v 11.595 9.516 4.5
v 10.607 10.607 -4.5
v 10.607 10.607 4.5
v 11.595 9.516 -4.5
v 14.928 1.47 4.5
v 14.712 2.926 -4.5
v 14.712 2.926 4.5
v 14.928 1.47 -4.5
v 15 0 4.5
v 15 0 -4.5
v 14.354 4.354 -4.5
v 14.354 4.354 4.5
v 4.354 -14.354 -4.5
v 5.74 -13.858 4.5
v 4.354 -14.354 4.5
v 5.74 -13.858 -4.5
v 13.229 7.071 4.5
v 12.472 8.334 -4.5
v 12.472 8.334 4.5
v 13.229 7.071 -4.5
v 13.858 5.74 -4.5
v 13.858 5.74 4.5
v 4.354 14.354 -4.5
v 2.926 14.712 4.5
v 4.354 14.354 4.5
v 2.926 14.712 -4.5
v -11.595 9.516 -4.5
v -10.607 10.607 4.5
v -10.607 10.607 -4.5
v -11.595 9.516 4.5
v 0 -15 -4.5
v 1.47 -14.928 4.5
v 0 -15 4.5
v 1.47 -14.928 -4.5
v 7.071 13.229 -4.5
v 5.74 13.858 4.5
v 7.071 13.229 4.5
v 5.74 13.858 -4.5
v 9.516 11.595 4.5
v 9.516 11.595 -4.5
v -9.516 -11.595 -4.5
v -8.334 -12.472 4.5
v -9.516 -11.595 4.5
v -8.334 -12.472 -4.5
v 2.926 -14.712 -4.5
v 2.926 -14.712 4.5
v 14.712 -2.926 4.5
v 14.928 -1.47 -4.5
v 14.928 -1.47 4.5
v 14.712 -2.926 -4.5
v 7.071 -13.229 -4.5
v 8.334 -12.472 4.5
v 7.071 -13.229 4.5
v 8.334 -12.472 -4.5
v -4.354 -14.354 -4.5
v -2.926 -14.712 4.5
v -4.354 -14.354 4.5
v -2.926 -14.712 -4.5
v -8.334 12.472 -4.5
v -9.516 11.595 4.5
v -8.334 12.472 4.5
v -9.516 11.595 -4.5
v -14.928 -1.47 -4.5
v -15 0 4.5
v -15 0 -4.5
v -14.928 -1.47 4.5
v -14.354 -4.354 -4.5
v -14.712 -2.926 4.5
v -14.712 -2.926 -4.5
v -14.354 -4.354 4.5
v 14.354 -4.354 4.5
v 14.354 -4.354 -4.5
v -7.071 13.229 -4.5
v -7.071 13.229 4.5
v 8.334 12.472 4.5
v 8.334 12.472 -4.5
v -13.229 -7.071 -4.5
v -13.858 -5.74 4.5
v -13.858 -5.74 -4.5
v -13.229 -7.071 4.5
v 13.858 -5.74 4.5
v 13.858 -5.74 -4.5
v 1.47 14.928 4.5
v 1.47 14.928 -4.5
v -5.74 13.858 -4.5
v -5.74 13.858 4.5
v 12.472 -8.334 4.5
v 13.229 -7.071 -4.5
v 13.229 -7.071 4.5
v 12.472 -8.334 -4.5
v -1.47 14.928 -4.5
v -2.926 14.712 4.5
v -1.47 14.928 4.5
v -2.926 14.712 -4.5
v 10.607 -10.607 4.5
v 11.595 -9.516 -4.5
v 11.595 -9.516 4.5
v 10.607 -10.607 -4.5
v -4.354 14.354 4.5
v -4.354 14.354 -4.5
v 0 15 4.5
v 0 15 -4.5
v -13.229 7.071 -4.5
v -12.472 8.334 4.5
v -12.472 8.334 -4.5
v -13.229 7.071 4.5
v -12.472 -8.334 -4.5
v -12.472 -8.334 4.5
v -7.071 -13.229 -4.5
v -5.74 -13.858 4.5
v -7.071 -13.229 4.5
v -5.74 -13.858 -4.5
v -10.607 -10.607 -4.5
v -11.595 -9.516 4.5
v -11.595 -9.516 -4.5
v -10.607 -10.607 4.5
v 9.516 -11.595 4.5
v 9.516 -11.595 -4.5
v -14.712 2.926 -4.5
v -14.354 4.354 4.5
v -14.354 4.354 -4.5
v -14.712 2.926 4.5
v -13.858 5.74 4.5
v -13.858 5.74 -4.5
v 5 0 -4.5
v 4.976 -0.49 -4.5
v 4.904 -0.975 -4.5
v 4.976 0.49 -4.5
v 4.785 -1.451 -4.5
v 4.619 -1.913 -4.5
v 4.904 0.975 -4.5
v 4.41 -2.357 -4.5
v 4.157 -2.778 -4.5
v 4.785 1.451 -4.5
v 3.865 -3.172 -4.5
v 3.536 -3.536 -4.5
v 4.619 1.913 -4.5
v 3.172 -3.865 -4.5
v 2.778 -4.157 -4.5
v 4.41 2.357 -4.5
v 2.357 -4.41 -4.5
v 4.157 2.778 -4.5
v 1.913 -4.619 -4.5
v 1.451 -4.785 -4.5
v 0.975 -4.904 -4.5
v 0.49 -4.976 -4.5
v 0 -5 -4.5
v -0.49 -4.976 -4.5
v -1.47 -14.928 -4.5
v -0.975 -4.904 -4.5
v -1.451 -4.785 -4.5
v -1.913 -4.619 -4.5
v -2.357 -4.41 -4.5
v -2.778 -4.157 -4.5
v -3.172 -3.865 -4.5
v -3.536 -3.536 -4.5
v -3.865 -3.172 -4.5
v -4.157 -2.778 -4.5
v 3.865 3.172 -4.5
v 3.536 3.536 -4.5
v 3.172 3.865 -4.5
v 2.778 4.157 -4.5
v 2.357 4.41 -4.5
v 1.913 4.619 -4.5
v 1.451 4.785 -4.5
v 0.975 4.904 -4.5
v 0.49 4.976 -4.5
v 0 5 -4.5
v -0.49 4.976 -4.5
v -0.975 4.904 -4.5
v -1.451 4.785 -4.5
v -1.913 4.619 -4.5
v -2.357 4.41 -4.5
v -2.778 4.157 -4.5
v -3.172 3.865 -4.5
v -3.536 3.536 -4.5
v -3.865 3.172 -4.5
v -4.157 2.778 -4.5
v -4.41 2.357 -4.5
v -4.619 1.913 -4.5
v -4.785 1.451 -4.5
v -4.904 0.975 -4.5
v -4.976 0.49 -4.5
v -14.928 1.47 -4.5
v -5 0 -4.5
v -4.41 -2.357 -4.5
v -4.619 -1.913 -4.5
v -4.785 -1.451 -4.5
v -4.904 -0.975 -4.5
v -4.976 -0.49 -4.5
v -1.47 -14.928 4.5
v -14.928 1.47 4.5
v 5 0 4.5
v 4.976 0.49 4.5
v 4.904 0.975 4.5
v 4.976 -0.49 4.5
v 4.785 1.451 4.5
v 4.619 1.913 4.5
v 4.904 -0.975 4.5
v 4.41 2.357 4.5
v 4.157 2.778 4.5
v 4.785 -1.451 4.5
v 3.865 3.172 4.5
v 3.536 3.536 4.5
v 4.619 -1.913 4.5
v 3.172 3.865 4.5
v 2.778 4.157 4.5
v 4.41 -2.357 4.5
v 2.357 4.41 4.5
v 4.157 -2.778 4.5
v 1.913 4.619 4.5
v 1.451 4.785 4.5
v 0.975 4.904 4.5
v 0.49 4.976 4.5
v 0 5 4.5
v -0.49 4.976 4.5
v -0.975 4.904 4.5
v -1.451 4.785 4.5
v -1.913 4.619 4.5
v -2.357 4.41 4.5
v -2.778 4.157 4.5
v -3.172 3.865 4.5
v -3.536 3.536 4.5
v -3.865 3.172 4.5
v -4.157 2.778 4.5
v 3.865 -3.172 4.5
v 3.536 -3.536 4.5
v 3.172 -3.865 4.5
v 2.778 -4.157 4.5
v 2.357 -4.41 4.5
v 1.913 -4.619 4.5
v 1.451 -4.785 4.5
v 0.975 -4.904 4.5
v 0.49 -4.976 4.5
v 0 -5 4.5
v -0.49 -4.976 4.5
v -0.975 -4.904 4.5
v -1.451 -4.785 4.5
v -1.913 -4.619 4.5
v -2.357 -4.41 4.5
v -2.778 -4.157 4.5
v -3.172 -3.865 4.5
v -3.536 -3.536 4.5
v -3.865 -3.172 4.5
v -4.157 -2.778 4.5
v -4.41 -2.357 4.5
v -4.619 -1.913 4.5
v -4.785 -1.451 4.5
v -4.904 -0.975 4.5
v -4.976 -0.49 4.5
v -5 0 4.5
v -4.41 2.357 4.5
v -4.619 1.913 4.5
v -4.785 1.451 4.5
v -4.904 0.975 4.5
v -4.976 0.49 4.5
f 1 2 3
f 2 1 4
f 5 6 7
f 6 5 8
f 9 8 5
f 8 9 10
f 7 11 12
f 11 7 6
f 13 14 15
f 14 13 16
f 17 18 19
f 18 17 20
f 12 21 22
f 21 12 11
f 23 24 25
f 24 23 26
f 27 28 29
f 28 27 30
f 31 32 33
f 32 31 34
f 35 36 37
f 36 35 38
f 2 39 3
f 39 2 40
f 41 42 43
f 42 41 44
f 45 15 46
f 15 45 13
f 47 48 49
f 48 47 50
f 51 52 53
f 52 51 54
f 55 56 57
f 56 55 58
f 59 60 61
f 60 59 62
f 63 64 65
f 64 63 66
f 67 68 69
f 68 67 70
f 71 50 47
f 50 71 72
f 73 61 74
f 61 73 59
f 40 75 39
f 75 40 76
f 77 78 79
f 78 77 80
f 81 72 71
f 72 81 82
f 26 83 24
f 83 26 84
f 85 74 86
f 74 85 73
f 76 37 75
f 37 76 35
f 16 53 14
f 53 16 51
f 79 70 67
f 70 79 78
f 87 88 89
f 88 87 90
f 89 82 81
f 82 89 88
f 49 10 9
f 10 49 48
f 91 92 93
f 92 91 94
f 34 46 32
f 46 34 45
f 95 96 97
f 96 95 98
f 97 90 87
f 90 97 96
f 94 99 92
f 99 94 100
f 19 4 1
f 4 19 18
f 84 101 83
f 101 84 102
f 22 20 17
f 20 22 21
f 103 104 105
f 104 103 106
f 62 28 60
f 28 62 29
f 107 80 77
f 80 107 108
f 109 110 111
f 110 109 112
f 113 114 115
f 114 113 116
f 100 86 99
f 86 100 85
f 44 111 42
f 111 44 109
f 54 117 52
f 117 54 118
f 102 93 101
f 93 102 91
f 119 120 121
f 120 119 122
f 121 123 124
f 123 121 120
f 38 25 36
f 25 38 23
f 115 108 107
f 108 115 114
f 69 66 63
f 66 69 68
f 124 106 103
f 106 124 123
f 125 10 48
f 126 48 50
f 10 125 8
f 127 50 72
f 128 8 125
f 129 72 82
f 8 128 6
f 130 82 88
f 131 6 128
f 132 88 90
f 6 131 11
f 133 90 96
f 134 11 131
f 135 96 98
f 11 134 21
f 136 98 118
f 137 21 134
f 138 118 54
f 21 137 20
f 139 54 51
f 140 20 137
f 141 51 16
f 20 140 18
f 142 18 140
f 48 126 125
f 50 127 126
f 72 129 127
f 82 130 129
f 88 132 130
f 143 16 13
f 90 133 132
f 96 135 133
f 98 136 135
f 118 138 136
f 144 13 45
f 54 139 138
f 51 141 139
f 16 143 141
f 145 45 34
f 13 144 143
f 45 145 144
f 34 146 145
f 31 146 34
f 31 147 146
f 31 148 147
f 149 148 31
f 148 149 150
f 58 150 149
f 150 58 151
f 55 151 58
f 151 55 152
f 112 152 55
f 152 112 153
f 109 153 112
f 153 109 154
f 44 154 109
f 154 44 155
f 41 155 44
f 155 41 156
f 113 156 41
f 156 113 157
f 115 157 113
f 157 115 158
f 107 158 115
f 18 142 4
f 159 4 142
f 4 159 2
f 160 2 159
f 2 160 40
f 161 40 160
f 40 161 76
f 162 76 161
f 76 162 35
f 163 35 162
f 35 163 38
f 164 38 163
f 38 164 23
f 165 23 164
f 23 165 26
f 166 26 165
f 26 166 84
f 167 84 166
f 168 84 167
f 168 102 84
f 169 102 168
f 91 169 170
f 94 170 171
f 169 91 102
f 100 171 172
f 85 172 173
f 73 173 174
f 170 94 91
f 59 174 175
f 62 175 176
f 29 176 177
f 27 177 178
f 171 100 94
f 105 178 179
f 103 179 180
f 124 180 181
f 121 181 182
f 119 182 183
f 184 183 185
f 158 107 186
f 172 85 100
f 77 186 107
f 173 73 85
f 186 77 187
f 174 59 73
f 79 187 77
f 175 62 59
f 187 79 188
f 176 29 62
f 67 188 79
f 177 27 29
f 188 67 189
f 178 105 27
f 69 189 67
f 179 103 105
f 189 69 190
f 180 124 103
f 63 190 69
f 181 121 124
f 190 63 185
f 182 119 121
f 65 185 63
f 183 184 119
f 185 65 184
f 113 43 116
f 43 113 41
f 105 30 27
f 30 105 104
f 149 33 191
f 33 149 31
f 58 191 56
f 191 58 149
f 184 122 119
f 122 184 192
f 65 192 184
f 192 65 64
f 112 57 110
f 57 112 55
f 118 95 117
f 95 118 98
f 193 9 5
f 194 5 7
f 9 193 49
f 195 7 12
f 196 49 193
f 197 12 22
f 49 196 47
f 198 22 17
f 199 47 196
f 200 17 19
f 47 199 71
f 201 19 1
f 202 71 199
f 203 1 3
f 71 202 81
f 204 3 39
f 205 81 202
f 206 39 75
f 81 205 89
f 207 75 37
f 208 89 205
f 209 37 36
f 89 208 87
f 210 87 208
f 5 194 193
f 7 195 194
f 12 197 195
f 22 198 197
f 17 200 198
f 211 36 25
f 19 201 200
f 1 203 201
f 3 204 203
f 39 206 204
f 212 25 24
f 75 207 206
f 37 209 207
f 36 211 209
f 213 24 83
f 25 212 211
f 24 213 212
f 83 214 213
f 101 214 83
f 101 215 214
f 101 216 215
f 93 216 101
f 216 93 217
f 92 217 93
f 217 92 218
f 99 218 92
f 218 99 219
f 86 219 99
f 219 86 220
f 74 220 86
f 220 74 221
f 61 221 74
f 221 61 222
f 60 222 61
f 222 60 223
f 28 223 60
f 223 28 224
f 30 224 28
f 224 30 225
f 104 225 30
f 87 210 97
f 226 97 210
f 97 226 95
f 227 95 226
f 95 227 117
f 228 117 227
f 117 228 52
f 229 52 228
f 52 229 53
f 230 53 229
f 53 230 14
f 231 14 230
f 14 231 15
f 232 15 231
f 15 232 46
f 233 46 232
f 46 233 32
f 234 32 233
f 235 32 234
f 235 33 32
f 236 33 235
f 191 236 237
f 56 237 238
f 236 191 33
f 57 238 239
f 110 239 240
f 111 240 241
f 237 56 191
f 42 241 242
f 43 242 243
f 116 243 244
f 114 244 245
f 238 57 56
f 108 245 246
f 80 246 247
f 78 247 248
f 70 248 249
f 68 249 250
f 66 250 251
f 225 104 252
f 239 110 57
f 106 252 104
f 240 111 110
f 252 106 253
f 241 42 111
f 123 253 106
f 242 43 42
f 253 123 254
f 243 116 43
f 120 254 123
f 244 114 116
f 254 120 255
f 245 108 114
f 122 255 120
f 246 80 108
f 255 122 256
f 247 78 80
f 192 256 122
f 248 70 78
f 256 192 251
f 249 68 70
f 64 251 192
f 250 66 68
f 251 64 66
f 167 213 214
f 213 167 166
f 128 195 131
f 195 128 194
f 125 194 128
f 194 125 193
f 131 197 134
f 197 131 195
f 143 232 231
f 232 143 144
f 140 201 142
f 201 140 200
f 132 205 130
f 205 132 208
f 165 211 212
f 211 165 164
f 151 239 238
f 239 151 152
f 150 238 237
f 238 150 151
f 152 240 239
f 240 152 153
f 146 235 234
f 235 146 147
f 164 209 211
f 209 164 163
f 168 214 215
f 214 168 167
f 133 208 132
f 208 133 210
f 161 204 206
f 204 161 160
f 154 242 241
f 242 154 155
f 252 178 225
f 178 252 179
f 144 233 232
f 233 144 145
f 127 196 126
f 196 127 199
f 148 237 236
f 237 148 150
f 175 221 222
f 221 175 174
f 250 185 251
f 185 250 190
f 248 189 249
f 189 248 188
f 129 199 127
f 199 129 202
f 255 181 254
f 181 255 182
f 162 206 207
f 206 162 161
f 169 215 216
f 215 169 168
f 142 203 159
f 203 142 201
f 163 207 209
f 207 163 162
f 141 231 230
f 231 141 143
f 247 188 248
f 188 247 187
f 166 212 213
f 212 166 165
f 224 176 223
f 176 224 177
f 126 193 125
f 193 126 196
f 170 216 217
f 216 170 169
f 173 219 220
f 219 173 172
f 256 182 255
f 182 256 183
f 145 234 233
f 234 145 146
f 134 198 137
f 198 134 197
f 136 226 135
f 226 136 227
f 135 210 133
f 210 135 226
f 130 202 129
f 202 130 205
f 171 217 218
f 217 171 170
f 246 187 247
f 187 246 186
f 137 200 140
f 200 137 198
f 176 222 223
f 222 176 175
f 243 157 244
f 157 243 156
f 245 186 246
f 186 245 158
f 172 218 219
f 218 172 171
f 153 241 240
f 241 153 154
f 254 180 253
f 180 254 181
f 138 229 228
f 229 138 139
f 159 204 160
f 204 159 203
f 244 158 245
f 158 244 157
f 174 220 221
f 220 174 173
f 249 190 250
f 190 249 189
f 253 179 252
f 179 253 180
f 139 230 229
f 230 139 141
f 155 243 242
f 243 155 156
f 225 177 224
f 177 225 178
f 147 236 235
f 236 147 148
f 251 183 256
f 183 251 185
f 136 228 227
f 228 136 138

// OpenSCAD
// Parameters
bore_diameter_mm = 10; //[5:20:0.5]
outer_diameter_mm = 30; //[15:60:0.5]
width_mm = 9; //[4.5:18:0.5]
eps_mm = 0.6; //[0.2:2:0.1]
race_radial_thickness_mm = 3; //[1.5:6:0.25]
ball_diameter_mm = 4; //[2:8:0.25]

// Ball Bearing - complete geometry
module ball_bearing() {
  color("Silver") {
    // Outer body with through bore
    difference() {
      cylinder(r=outer_diameter_mm/2, h=width_mm, center=true, $fn=64);
      cylinder(r=bore_diameter_mm/2, h=width_mm + 2*eps_mm, center=true, $fn=64);
    }
    // Outer race
    difference() {
      cylinder(r=outer_diameter_mm/2, h=width_mm, center=true, $fn=64);
      cylinder(r=outer_diameter_mm/2 - race_radial_thickness_mm, h=width_mm, center=true, $fn=64);
    }
  }
}

// Bearing Ball - complete geometry
module bearing_ball() {
  color("DimGray") {
    translate([
      bore_diameter_mm/2 + race_radial_thickness_mm + 
      (outer_diameter_mm/2 - race_radial_thickness_mm - 
      (bore_diameter_mm/2 + race_radial_thickness_mm))/2, 
      0, 
      0
    ])
    sphere(r=ball_diameter_mm/2, $fn=32);
  }
}

// Inner Race - complete geometry
module inner_race() {
  color("Silver") {
    difference() {
      cylinder(r=bore_diameter_mm/2 + race_radial_thickness_mm, h=width_mm, center=true, $fn=64);
      cylinder(r=bore_diameter_mm/2, h=width_mm + 2*eps_mm, center=true, $fn=64);
    }
  }
}

// Assembly
module assembly() {
  ball_bearing();
  inner_race();
  bearing_ball();
}

assembly();
